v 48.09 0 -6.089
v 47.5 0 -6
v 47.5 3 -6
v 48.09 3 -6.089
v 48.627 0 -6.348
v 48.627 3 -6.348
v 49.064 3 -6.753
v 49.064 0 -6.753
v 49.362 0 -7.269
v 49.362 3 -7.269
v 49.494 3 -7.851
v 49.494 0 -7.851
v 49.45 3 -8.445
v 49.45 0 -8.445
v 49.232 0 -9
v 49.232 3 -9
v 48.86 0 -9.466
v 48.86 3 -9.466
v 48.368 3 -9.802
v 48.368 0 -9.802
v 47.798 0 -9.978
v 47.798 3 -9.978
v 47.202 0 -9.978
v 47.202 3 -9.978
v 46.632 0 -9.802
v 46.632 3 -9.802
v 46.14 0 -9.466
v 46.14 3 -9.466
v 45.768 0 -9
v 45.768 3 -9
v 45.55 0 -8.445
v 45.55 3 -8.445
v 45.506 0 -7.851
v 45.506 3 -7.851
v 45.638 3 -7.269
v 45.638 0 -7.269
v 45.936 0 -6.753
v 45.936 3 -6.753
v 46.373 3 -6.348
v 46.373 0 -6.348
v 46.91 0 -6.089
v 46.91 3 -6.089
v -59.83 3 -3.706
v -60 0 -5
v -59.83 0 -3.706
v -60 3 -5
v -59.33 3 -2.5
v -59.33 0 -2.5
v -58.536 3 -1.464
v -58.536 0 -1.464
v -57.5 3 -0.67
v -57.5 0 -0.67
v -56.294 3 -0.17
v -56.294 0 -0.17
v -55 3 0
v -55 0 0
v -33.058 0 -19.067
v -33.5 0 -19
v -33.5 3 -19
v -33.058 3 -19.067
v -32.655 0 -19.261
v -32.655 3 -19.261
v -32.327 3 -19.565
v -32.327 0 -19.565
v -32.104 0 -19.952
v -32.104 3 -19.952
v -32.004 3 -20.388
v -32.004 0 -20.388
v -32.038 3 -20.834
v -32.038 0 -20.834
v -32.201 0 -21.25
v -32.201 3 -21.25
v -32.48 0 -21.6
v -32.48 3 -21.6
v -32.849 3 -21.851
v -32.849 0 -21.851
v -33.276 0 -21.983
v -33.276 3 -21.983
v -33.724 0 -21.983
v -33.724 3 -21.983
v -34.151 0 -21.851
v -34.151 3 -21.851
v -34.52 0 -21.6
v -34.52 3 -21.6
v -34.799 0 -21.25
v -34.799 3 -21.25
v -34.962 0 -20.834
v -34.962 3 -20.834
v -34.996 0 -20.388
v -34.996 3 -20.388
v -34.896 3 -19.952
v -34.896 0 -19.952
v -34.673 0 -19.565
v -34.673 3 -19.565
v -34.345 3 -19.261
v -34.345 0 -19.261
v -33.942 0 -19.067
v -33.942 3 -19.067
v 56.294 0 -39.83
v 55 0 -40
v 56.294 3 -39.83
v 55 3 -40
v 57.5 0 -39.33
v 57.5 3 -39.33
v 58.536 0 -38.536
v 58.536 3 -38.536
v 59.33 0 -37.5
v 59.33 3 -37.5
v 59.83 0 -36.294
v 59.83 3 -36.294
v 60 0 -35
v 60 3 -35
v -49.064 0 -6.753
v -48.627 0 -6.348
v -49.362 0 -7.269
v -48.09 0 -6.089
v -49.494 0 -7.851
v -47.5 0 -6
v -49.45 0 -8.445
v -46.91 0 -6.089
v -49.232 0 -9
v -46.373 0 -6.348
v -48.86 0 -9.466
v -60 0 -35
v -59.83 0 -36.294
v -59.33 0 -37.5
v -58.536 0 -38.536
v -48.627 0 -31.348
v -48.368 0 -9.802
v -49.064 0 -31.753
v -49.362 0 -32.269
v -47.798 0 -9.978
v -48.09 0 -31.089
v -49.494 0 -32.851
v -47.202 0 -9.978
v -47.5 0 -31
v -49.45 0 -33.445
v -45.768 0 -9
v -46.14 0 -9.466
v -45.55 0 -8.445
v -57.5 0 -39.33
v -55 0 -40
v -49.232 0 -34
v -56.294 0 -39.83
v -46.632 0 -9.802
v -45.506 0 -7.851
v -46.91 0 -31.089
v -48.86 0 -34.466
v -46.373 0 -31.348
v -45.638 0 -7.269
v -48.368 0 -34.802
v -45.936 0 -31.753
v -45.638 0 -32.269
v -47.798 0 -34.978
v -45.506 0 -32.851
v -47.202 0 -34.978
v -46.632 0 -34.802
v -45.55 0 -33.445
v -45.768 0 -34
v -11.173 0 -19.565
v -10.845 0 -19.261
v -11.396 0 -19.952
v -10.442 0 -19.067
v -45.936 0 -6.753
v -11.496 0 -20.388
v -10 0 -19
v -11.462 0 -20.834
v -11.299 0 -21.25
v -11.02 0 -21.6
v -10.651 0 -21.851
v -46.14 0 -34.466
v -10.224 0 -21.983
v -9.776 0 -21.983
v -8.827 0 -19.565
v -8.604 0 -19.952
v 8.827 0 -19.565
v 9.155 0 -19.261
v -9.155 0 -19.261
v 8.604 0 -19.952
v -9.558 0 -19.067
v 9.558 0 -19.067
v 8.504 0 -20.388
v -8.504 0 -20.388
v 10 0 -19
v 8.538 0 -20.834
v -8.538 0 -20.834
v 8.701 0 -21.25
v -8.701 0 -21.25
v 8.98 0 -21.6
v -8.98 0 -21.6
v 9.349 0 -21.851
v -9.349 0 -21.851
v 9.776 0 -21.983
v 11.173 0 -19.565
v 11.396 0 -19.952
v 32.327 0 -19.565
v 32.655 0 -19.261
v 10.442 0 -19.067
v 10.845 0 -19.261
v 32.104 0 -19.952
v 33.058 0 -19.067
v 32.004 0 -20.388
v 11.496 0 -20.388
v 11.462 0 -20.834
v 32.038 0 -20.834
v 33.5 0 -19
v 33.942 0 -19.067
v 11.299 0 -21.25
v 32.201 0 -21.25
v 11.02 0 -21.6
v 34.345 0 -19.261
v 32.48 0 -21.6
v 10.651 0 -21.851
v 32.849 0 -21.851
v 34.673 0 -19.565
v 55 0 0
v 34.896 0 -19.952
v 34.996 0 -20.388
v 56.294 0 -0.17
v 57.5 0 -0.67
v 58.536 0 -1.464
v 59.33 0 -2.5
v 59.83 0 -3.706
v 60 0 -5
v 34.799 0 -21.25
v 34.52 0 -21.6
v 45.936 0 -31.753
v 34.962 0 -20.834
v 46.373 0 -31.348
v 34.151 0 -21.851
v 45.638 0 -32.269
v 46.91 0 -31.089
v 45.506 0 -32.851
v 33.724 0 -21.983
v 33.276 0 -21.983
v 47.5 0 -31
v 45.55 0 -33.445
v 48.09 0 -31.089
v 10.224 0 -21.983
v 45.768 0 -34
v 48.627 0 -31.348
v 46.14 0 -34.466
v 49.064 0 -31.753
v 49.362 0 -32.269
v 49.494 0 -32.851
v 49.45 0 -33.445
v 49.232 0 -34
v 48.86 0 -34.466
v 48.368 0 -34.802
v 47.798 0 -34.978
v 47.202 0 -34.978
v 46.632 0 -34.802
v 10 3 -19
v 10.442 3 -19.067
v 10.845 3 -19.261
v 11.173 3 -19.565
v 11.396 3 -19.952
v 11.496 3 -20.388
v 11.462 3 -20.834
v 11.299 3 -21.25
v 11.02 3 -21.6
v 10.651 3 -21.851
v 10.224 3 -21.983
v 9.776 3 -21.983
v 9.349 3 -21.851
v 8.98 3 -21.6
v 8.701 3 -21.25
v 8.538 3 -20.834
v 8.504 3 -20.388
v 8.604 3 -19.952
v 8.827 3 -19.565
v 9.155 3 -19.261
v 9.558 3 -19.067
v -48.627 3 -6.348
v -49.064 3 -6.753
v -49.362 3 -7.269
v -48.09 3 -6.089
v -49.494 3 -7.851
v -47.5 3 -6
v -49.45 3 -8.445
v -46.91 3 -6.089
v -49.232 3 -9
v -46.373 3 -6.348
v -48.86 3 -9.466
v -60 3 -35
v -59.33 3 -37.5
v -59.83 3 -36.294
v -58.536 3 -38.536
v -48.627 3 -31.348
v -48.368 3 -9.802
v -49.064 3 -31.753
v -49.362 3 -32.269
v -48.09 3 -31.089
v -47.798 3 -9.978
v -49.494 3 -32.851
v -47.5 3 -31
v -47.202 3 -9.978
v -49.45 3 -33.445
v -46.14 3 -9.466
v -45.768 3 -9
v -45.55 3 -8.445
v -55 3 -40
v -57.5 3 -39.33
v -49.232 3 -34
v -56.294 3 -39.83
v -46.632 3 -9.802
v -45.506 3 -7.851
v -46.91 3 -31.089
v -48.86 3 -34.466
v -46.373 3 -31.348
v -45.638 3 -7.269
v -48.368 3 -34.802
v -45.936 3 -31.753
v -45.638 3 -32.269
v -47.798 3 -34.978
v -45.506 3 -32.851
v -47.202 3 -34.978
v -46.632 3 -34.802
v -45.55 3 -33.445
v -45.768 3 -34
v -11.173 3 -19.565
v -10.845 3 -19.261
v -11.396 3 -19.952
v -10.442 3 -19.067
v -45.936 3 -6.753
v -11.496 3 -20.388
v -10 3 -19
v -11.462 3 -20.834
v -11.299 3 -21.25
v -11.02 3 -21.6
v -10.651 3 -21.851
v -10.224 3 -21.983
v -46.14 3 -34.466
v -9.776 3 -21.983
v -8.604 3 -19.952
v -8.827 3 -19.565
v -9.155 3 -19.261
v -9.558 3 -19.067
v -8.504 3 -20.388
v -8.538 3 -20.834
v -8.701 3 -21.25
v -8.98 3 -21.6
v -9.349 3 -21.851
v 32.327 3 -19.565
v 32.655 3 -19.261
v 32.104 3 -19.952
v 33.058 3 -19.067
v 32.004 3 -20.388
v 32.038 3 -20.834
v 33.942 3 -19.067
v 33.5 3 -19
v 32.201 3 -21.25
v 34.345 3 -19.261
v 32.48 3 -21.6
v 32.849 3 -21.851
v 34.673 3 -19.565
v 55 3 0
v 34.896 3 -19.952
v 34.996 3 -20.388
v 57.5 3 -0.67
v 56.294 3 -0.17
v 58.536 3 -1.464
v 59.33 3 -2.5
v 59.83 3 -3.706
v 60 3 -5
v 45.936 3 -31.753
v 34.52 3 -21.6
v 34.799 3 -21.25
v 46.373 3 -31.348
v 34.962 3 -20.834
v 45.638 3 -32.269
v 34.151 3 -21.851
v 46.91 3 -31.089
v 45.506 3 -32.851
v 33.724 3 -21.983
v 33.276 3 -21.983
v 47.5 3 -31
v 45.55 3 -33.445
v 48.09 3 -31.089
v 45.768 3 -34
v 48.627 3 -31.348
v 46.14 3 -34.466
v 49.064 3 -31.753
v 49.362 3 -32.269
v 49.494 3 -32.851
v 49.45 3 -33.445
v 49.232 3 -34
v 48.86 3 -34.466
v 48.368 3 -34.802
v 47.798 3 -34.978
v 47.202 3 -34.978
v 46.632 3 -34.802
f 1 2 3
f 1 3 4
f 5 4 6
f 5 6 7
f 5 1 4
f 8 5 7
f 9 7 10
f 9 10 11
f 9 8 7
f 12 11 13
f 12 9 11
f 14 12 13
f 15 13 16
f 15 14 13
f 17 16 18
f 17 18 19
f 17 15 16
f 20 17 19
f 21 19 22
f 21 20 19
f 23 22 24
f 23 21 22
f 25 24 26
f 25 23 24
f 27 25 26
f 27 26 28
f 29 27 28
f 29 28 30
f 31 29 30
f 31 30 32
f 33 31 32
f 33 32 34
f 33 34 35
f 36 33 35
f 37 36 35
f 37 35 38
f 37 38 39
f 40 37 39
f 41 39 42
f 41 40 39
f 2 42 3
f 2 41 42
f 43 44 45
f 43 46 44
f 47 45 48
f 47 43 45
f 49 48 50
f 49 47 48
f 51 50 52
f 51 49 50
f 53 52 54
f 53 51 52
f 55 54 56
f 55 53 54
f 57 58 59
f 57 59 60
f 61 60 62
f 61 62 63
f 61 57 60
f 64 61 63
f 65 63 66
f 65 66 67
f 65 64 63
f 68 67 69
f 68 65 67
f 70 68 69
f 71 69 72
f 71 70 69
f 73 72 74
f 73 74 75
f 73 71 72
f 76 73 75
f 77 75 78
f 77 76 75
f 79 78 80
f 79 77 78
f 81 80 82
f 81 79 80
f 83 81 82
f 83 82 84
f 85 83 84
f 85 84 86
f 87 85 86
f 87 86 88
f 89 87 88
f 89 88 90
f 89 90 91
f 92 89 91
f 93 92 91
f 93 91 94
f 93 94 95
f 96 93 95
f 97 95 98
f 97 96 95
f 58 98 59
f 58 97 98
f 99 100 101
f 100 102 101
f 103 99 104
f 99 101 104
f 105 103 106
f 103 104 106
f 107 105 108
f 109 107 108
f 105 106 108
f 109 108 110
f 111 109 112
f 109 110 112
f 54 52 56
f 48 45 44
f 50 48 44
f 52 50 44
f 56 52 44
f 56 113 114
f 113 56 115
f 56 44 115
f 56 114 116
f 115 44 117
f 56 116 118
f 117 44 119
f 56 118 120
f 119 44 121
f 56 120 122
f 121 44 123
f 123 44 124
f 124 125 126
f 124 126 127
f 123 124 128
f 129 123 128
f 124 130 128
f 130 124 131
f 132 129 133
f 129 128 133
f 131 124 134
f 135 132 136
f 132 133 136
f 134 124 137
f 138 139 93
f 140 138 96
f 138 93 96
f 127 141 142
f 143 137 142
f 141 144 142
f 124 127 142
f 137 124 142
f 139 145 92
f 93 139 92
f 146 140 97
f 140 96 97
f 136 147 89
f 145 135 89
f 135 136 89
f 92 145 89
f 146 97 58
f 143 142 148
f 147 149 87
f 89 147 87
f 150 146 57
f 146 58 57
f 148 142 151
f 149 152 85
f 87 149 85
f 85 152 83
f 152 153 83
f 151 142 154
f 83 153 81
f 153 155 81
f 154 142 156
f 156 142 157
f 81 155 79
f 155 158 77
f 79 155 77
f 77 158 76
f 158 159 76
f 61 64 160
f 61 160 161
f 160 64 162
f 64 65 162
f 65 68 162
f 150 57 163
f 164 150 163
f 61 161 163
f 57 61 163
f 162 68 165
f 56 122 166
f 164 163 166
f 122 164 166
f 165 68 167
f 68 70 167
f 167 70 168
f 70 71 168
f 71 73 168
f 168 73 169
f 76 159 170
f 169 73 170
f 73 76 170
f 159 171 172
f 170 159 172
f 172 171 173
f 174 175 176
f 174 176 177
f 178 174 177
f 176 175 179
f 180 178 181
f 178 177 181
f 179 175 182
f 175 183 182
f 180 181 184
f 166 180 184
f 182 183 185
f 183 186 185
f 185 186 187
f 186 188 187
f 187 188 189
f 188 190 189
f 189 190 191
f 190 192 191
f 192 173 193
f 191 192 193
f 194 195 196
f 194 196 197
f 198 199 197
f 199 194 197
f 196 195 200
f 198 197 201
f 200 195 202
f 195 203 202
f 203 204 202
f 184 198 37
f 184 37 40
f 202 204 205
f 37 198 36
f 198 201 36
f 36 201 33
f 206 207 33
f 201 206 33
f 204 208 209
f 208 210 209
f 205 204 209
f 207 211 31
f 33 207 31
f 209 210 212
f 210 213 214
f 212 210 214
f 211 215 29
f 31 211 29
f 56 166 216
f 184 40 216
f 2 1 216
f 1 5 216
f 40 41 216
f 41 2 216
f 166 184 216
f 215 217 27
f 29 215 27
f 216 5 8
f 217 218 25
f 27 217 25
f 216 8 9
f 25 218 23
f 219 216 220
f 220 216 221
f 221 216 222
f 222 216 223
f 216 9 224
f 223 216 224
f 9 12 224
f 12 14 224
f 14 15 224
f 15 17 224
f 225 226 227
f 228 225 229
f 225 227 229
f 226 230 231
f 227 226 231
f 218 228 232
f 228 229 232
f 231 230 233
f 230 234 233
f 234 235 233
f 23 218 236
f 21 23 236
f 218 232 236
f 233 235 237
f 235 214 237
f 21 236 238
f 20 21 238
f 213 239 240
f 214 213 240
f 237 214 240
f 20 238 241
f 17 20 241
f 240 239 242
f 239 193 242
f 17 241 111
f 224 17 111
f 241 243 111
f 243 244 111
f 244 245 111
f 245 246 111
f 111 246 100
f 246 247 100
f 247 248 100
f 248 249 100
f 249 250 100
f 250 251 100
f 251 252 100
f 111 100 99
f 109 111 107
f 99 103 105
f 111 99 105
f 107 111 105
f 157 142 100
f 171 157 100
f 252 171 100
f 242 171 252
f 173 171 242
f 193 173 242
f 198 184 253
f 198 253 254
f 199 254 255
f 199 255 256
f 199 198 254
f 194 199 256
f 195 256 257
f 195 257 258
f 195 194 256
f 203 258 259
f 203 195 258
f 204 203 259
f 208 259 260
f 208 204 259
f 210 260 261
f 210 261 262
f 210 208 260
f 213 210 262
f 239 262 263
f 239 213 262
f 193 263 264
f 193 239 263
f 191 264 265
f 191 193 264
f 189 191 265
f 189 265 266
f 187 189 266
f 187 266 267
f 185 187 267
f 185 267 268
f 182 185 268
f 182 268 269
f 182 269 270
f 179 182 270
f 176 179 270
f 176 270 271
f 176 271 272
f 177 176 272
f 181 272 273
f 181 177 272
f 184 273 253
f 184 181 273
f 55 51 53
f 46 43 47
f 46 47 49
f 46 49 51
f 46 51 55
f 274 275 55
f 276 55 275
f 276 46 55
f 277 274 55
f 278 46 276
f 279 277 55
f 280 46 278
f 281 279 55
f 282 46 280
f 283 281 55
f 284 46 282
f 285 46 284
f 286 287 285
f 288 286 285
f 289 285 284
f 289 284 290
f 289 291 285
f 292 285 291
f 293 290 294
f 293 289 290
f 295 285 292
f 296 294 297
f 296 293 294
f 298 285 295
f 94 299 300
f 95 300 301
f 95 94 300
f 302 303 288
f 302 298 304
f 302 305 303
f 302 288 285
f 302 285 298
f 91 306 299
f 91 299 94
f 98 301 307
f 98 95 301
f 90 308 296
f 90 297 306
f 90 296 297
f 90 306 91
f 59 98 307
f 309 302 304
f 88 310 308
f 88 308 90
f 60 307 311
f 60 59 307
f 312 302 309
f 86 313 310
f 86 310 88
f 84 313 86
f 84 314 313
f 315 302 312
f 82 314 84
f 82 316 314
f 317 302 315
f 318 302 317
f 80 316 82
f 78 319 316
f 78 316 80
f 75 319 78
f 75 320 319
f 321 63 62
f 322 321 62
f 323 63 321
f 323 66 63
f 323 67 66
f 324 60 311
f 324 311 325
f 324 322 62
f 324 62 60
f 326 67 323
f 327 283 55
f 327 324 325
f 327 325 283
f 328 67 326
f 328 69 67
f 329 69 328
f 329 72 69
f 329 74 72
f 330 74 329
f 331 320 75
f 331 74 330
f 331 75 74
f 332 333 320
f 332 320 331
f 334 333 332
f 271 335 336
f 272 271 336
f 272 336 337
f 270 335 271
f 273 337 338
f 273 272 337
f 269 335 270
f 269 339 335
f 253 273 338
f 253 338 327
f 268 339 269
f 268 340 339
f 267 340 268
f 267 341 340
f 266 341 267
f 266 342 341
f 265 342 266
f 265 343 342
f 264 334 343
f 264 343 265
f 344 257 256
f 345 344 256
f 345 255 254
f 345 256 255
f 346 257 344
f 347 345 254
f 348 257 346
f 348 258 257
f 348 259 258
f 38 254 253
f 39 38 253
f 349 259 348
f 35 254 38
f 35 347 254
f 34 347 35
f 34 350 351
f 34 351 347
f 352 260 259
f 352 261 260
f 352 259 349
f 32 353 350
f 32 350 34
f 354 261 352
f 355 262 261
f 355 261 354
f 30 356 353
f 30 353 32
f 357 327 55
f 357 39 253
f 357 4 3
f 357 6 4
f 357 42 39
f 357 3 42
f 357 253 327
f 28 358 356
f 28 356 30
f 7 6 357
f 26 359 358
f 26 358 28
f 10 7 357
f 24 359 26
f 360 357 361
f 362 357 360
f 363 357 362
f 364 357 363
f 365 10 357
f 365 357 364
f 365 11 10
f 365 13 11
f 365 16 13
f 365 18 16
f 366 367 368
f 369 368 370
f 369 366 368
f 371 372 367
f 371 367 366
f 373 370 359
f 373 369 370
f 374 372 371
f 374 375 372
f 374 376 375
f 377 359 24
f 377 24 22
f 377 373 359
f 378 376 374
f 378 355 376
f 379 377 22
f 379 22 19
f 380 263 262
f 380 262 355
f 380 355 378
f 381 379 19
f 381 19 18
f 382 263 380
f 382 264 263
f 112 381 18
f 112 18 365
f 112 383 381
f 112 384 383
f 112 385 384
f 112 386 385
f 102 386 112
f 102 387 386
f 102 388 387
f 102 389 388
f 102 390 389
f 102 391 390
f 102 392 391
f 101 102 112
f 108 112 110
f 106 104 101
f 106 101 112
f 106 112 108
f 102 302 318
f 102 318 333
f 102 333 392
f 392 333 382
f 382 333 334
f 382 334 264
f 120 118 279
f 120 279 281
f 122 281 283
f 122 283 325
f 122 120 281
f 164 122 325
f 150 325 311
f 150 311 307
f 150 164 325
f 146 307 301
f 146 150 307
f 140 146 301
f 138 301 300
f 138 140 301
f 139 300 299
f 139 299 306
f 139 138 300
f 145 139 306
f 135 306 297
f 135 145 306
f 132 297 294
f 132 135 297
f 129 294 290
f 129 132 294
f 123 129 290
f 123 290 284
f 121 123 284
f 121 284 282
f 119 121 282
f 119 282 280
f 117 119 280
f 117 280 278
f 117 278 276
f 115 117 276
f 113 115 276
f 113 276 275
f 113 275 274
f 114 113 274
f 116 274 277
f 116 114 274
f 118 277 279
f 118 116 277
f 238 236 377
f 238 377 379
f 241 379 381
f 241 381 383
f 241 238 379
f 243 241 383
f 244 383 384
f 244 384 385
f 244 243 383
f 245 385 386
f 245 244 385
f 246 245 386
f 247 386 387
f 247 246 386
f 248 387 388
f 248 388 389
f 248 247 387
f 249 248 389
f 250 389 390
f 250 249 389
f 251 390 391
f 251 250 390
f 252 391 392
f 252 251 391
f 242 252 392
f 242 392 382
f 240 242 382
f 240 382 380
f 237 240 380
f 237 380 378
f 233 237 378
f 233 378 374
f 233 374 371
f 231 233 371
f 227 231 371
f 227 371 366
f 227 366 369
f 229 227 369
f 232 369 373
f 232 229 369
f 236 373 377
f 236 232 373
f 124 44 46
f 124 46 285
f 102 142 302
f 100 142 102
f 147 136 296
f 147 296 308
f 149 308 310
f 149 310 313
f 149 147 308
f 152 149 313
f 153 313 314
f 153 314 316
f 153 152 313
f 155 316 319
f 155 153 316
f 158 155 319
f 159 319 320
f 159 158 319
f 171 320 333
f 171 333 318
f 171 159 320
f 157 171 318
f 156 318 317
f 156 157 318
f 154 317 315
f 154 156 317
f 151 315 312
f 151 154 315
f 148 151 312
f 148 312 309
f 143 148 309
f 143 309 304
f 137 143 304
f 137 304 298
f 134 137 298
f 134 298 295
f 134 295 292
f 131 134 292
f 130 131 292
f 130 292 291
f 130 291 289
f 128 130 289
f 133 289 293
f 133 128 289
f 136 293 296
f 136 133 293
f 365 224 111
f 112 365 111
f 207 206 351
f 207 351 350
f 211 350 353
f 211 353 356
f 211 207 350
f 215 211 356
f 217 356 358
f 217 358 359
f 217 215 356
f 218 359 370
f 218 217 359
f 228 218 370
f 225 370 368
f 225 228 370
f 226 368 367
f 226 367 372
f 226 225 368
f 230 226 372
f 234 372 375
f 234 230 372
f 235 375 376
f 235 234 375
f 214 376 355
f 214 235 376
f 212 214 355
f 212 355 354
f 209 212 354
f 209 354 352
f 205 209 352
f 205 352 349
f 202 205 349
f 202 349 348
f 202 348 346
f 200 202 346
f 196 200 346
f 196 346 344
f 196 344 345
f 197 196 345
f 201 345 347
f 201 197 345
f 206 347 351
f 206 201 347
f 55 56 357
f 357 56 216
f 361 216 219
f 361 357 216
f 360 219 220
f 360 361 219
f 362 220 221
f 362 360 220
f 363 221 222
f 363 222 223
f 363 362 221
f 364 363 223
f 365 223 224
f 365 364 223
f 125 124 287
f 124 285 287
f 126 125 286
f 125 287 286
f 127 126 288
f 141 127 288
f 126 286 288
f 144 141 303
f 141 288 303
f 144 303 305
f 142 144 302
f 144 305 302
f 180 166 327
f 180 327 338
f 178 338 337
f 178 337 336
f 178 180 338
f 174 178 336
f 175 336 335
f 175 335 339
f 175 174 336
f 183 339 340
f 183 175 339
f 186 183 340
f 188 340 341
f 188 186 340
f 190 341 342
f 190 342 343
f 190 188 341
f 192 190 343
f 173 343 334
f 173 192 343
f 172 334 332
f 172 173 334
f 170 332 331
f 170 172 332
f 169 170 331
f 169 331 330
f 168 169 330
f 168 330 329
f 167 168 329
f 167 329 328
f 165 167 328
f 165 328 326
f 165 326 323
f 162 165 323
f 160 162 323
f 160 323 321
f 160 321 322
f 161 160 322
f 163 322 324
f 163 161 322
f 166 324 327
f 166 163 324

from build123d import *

# Parameters (mm, degrees)
SKETCH_1_W      = 120
SKETCH_1_H      = 40
SKETCH_1_R      = 1.5
SKETCH_1_R_2    = 2
EXTRUDE_1_DEPTH = 3
FILLET_1_R      = 5


with BuildPart() as part:
    # 草图1 → 凸台-拉伸1 (new body)
    with BuildSketch(Plane(origin=(0, 0, 0), x_dir=(1, 0, 0), z_dir=(0, 1, 0))):
        with Locations((0, 20)):
            Rectangle(SKETCH_1_W, SKETCH_1_H)
        with Locations(Location((10, 20.5, 0), (0, 0, 270))):
            Circle(SKETCH_1_R, mode=Mode.SUBTRACT)
        with Locations(Location((-10, 20.5, 0), (0, 0, 270))):
            Circle(SKETCH_1_R, mode=Mode.SUBTRACT)
        with Locations(Location((-33.5, 20.5, 0), (0, 0, 270))):
            Circle(SKETCH_1_R, mode=Mode.SUBTRACT)
        with Locations(Location((33.5, 20.5, 0), (0, 0, 270))):
            Circle(SKETCH_1_R, mode=Mode.SUBTRACT)
        with Locations(Location((-47.5, 8, 0), (0, 0, 270))):
            Circle(SKETCH_1_R_2, mode=Mode.SUBTRACT)
        with Locations(Location((-47.5, 33, 0), (0, 0, 270))):
            Circle(SKETCH_1_R_2, mode=Mode.SUBTRACT)
        with Locations(Location((47.5, 33, 0), (0, 0, 270))):
            Circle(SKETCH_1_R_2, mode=Mode.SUBTRACT)
        with Locations(Location((47.5, 8, 0), (0, 0, 270))):
            Circle(SKETCH_1_R_2, mode=Mode.SUBTRACT)
    extrude(amount=EXTRUDE_1_DEPTH)

    # 圆角1
    fillet_1_edges = [part.edges().sort_by_distance(p)[0] for p in [
        (-60, 1.5, -40),
        (60, 1.5, -40),
        (60, 1.5, 0),
        (-60, 1.5, 0),
    ]]
    fillet(fillet_1_edges, radius=FILLET_1_R)


solid = part.part
